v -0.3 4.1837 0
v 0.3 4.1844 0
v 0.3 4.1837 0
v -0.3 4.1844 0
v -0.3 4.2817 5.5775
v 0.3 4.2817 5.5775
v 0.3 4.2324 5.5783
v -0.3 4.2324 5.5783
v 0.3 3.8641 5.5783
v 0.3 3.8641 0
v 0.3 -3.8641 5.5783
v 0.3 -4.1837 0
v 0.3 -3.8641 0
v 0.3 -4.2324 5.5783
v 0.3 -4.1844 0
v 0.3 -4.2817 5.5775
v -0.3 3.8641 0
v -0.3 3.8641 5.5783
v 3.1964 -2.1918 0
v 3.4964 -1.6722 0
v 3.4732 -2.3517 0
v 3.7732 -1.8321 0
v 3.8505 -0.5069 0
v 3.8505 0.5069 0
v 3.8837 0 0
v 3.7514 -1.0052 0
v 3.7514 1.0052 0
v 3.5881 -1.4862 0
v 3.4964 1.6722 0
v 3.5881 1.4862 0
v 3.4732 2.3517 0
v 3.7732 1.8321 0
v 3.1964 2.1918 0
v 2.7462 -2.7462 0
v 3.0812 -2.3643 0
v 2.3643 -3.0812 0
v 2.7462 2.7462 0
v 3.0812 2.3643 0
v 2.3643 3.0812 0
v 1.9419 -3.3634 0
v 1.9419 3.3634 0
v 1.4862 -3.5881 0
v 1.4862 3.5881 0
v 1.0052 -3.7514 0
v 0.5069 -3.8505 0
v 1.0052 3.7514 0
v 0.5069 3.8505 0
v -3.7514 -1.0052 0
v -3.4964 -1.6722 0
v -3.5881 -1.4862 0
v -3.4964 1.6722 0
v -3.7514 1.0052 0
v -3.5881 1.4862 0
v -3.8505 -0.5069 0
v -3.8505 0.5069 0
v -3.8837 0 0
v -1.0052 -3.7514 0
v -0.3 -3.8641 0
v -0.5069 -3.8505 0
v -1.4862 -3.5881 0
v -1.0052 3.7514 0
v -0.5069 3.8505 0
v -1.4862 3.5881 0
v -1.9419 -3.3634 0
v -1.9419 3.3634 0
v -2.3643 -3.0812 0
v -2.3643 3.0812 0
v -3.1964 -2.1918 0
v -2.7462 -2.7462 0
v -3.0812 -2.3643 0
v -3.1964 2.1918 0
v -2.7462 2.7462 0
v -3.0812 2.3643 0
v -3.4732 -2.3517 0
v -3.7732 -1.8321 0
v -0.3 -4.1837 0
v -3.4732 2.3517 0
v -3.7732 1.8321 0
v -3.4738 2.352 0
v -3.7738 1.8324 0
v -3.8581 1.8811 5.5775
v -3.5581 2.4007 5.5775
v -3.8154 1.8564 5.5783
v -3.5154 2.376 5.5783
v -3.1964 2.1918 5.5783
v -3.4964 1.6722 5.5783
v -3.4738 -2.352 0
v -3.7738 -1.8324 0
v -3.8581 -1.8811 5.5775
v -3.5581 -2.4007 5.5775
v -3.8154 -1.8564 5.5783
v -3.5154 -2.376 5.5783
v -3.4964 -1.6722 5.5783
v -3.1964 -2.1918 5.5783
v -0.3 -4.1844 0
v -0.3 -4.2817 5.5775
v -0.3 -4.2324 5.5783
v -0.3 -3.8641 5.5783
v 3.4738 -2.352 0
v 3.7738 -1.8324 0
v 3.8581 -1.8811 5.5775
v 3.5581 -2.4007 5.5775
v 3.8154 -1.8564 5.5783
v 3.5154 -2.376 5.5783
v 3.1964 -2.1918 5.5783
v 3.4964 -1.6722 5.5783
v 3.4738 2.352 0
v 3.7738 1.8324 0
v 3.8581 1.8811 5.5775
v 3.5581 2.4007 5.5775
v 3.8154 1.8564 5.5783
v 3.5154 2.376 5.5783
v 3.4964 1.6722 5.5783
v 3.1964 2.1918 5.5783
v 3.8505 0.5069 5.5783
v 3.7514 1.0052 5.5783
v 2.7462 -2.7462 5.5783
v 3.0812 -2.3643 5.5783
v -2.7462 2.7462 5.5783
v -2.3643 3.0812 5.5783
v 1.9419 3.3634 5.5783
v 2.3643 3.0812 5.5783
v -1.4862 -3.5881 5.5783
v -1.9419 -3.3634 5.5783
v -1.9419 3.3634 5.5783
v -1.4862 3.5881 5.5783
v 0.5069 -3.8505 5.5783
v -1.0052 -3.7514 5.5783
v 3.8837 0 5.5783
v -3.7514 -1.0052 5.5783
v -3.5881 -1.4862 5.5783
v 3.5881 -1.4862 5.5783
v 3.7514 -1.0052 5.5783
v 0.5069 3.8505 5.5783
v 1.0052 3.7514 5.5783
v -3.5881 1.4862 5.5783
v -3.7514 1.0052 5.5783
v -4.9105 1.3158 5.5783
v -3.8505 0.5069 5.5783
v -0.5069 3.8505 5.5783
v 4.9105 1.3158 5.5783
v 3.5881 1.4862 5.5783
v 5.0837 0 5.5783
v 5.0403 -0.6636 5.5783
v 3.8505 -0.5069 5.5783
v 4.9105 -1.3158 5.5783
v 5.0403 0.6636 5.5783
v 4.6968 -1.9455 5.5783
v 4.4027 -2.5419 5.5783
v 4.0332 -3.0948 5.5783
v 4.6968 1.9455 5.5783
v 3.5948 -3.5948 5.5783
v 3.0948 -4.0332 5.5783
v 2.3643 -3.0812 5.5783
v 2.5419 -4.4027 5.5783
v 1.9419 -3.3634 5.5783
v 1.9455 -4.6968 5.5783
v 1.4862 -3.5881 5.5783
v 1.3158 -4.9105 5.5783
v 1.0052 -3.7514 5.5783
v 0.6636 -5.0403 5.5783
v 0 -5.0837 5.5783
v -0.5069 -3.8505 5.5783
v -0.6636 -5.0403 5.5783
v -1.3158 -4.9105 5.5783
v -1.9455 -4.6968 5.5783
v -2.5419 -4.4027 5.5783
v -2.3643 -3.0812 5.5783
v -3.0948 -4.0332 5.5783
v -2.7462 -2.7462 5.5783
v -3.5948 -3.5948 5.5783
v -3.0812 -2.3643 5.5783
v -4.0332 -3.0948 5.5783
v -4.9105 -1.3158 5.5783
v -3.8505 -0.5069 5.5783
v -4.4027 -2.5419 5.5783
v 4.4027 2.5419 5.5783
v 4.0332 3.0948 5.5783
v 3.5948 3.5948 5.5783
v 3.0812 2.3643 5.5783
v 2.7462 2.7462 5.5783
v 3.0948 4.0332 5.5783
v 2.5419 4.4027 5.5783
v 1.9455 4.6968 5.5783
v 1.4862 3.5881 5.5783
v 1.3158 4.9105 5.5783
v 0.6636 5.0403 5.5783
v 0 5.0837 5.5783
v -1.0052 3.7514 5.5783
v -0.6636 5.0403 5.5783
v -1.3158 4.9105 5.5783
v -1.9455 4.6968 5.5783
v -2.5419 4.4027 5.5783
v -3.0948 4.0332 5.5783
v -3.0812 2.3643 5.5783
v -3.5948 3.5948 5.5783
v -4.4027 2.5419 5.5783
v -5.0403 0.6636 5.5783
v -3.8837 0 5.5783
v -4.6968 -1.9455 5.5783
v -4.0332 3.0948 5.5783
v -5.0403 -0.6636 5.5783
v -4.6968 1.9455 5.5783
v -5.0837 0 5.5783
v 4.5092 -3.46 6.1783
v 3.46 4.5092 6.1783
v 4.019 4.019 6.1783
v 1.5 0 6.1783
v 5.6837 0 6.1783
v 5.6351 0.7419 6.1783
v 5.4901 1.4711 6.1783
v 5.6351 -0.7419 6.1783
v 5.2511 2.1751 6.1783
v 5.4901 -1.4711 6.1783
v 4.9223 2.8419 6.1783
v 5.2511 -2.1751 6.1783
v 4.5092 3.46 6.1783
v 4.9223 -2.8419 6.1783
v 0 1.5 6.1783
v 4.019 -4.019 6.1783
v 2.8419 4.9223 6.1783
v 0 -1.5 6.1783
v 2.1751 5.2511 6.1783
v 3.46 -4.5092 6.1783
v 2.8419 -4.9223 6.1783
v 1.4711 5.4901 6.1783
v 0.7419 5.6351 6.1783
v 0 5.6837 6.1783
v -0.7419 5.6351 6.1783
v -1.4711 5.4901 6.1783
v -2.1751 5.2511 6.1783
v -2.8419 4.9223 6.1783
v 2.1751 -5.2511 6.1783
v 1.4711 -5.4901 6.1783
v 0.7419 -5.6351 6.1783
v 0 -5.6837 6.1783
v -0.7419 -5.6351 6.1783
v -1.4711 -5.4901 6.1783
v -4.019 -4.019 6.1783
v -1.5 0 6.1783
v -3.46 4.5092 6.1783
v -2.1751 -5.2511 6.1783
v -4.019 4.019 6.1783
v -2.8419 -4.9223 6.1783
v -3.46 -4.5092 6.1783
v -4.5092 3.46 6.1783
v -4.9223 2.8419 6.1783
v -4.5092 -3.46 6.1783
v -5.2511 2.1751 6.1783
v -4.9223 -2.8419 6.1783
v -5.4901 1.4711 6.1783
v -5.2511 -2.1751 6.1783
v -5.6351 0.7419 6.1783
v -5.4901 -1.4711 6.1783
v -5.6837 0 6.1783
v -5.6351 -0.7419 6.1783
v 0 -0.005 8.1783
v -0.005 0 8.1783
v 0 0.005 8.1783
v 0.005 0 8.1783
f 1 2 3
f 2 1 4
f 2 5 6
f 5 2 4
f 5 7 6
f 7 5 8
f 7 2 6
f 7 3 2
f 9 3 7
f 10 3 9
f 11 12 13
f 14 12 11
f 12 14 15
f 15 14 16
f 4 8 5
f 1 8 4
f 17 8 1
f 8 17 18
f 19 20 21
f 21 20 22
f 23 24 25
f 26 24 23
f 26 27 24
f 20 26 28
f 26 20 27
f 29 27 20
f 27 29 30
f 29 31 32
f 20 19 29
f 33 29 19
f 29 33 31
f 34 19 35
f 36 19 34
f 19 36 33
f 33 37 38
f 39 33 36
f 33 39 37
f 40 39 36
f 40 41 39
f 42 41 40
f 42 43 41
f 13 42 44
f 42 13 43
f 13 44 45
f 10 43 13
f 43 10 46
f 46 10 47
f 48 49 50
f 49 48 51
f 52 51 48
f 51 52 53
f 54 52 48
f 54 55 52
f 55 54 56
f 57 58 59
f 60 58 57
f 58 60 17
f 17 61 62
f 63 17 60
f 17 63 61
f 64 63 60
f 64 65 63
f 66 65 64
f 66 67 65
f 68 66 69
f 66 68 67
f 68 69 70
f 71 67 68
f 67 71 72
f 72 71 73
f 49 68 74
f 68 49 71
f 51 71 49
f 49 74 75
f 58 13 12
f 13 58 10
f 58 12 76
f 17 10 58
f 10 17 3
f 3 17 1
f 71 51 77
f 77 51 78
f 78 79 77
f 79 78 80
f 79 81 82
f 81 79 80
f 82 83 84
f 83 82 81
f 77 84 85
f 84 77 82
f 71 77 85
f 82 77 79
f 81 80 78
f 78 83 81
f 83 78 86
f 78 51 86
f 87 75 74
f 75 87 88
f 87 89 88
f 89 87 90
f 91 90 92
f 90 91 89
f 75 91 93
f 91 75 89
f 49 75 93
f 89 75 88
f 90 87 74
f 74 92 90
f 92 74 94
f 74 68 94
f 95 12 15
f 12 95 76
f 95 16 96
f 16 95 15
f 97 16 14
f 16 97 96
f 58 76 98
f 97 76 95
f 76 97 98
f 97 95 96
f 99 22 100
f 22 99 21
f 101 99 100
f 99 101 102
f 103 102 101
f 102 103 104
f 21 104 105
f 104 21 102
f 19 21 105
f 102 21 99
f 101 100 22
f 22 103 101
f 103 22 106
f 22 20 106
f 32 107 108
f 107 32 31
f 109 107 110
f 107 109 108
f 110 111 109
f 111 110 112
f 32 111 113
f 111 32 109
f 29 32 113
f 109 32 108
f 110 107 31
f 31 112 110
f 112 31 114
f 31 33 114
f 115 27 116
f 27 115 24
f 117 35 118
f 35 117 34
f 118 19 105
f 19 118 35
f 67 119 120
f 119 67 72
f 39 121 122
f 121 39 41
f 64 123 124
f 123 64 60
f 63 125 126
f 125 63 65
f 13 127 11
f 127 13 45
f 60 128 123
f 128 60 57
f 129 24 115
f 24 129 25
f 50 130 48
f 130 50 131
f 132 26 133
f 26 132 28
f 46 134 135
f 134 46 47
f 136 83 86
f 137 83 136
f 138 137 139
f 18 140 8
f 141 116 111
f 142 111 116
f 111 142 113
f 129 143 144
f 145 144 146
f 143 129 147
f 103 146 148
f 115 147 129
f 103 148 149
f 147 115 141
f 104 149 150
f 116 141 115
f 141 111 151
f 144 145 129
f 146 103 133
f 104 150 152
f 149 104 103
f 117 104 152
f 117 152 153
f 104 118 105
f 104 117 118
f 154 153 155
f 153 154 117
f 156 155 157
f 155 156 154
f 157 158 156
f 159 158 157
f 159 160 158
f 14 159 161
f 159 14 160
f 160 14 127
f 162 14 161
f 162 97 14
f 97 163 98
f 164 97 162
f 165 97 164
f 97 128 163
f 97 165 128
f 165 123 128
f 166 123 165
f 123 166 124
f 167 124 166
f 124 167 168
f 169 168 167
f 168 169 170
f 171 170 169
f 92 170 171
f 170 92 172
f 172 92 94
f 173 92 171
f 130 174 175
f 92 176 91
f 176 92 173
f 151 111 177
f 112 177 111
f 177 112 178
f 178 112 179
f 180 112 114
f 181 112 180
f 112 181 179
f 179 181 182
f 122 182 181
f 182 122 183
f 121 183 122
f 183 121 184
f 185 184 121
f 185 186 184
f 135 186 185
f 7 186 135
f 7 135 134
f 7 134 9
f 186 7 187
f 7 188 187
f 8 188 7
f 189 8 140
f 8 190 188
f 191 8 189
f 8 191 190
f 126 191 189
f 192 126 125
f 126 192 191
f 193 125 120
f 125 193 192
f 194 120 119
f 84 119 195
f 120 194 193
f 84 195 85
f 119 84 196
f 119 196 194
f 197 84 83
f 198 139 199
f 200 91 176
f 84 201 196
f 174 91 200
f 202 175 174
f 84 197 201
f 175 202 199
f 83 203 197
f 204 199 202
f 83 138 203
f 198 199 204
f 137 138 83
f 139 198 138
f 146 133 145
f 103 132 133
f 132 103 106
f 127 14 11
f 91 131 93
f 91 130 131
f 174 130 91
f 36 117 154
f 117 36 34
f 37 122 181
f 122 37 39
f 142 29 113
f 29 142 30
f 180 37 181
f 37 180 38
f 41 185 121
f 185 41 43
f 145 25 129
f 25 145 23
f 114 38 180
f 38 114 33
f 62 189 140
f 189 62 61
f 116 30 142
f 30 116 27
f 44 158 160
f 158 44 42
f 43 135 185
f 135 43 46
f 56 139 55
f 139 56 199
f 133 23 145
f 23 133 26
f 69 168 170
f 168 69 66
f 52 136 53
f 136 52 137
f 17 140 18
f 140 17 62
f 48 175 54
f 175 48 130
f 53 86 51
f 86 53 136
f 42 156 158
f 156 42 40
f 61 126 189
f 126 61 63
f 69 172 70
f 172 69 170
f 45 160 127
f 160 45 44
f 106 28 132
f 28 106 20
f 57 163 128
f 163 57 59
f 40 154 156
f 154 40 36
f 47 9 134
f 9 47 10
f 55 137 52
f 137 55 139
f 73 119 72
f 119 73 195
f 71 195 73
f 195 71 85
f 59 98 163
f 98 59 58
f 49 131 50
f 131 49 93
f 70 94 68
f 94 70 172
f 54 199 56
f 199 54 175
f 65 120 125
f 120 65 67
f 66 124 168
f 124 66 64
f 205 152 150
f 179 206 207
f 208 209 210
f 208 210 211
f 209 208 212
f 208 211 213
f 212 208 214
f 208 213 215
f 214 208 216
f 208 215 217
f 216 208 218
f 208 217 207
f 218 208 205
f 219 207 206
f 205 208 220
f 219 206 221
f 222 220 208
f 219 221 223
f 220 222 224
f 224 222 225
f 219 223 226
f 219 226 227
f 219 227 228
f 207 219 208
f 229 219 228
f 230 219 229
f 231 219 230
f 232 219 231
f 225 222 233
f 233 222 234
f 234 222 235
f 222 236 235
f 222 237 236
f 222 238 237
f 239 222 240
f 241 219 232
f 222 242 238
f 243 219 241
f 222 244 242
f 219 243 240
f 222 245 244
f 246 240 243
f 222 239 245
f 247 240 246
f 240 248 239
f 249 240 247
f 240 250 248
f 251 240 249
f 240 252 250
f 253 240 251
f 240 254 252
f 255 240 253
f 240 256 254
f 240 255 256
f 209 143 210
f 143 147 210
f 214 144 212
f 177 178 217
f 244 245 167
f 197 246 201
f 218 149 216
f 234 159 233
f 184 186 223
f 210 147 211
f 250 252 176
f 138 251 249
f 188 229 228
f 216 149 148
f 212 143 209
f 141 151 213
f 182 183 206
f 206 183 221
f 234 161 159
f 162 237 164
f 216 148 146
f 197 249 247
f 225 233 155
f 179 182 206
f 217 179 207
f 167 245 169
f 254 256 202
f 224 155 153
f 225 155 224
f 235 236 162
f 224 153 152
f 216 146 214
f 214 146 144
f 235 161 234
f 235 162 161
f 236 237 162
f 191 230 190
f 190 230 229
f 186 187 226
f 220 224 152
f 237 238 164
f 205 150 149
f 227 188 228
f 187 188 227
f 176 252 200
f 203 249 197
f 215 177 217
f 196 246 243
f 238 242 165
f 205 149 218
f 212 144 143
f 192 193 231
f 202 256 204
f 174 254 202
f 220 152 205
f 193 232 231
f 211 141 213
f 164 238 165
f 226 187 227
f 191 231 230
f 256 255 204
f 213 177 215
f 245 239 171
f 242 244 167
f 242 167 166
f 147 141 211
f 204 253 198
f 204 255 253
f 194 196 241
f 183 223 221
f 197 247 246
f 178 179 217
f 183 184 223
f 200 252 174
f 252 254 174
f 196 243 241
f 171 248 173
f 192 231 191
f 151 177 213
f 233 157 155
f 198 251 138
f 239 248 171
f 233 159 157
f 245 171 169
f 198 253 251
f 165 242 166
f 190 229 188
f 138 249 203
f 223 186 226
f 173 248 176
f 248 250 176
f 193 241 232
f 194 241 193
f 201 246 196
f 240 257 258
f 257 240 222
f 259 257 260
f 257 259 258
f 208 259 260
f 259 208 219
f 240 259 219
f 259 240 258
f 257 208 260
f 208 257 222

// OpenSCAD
// This allows you to make customized dowel centers.
// USAGE: When assembling a wood project with dowels, drill the hole on
// one piece, then insert these.  Press the mating piece together and
// it will give you perfectly-aligned marks for drilling the other side.
//
// Licensed under CreativeCommons-Attribution-ShareAlike
// To fulfil the attribution requirement, please provide a link to:
//		http://www.thingiverse.com/thing:927256

/* [main] */

// The units used for the rest of this page
dowel_units=0; // [0:Inches,1:mm]

dowel_dia=0.3125;

// if =0, will do a best guess
dowel_depth=0;

/* [advanced stuff you probably shouldn't mess with] */

// Magic number to account for drill wobble, etc.
hole_dia_oversize=0.43;

// How deep in mm the anti-friction ribs are.
rib_min_thickness=0.3;

// Thickness in mm of the anti-friction ribs
rib_thickness=0.6;

// How many anti-friction ribs
num_ribs=6;

// How many degrees the anti-friction ribs tilt out (to wedge tightly into the hole)
rib_angle=1;

// How many sides the point has
point_sides=4;

// How big around the point is
point_radius=1.5;

// How tall the point is.  If <0, then it will be 1 1/3 the point_radius
point_height=0;

// How far the rim overhangs (too high could cause printability issues)
rim_overhang=1.5;

rim_thickness=0.6;

// resolution
fn=48;

/* [hidden] */
r=((dowel_units==0?dowel_dia*25.4:dowel_dia)+hole_dia_oversize)/2;
ir=r-rib_min_thickness;
h=dowel_depth<=0?r*4/3:(dowel_units==0?dowel_depth*25.4:dowel_depth);
overhang_r=r+rim_overhang;
point_r=min(point_radius,r*2/3);
point_h=point_height<=0?point_r*4/3:point_height;

cylinder(r=ir,h=h,$fn=fn);
for(a=[0:360/num_ribs:359.99]){
	rotate([0,0,a]) union(){
		rotate([-rib_angle,0,0]) translate([-rib_thickness/2,0,r*sin(rib_angle)]) cube([rib_thickness,r,h]);
		translate([-rib_thickness/2,0,0]) cube([rib_thickness,r,h]); // to prevent a gap at the bottom
	}
}
translate([0,0,h]) cylinder(r2=overhang_r,r1=overhang_r-rim_thickness,h=rim_thickness,$fn=fn);// overhang
translate([0,0,h+rim_thickness]) cylinder(r1=point_r,r2=0.005,h=point_h,$fn=point_sides);// point
